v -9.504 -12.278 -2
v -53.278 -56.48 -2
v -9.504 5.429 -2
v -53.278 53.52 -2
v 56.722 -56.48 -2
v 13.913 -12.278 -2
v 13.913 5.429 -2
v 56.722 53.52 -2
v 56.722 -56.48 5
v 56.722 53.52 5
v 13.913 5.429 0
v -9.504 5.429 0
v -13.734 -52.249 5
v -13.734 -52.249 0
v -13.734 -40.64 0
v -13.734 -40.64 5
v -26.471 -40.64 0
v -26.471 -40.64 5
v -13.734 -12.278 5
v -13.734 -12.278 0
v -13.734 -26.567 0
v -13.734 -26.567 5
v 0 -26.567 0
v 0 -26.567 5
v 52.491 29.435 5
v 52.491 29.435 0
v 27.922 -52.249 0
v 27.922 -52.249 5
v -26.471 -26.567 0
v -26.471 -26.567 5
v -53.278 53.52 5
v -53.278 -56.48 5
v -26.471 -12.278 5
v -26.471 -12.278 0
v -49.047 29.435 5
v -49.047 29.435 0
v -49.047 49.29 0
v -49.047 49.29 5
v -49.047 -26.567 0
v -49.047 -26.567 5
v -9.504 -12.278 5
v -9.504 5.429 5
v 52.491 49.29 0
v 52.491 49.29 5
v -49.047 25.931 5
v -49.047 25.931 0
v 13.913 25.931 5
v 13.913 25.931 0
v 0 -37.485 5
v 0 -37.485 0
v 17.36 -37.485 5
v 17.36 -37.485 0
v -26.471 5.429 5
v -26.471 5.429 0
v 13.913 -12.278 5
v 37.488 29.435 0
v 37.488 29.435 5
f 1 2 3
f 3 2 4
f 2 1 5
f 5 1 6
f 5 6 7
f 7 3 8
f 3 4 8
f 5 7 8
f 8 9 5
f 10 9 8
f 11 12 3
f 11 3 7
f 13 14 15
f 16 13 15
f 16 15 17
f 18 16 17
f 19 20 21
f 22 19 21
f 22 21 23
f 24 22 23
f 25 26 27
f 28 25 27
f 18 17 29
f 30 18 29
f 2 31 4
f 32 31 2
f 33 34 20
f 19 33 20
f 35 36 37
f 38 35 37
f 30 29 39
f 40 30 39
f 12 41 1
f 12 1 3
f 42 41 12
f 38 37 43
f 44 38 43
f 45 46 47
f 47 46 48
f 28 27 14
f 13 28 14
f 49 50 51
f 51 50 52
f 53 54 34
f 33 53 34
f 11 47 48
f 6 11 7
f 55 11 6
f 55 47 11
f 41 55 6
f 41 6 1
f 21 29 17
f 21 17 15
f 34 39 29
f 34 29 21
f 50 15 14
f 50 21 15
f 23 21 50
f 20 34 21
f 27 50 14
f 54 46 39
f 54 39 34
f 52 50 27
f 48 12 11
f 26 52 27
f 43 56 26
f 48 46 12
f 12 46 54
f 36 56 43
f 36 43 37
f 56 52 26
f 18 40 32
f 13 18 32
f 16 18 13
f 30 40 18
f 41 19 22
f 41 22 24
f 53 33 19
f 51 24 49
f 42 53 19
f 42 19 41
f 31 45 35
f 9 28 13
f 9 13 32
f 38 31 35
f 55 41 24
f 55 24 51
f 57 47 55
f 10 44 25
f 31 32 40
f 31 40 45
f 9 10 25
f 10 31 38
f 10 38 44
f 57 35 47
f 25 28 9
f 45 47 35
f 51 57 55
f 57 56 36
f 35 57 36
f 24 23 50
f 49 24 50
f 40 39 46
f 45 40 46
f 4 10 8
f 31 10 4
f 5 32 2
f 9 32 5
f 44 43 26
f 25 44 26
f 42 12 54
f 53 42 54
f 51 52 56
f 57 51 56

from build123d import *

# Parameters (mm, degrees)
F1_DEPTH = 5
F2_DEPTH = 2


# Not quite as in the source:
# - a feature names something its author has since deleted; it is built from what else it names


with BuildPart() as f1:
    # F0 (on Top) → F1 (new body)
    with BuildSketch(Plane.XY):
        Polygon((-53.2781591106, 53.5204063327), (-53.2781591106, -56.4795936673), (-13.7344817631, -56.4795936673), (56.7218408894, -56.4795936673), (56.7218408894, 53.5204063327), align=None)
        Polygon((-49.0473898798, 29.4351325184), (-49.0473898798, 49.289637102), (52.4910716586, 49.289637102), (52.4910716586, 29.4351325184), (27.9224817305, -52.2488244365), (-13.7344817631, -52.2488244365), (-13.7344817631, -40.6398742527), (-26.4708319562, -40.6398742527), (-26.4708319562, -26.5670741801), (-49.0473898798, -26.5670741801), (-49.0473898798, 5.428542512), (-49.0473898798, 25.9305896417), (-26.4708319562, 25.9305896417), (13.9133328608, 25.9305896417), (13.9133328608, 5.428542512), (13.9133328608, -12.2777693511), (-9.5037125323, -12.2777693511), (-9.5037125323, 5.428542512), (-26.4708319562, 5.428542512), (-26.4708319562, -12.2777693511), (-13.7344817631, -12.2777693511), (-13.7344817631, -26.5670741801), (0, -26.5670741801), (0, -37.4845501322), (17.3598656954, -37.4845501322), (37.487713347, 29.4351325184), align=None, mode=Mode.SUBTRACT)
    extrude(amount=F1_DEPTH)

    # F0 (on Top) → F2 (join)
    with BuildSketch(Plane.XY):
        Polygon((-53.2781591106, 53.5204063327), (-53.2781591106, -56.4795936673), (-13.7344817631, -56.4795936673), (56.7218408894, -56.4795936673), (56.7218408894, 53.5204063327), align=None)
        Polygon((-49.0473898798, 29.4351325184), (-49.0473898798, 49.289637102), (52.4910716586, 49.289637102), (52.4910716586, 29.4351325184), (27.9224817305, -52.2488244365), (-13.7344817631, -52.2488244365), (-13.7344817631, -40.6398742527), (-26.4708319562, -40.6398742527), (-26.4708319562, -26.5670741801), (-49.0473898798, -26.5670741801), (-49.0473898798, 5.428542512), (-49.0473898798, 25.9305896417), (-26.4708319562, 25.9305896417), (13.9133328608, 25.9305896417), (13.9133328608, 5.428542512), (13.9133328608, -12.2777693511), (-9.5037125323, -12.2777693511), (-9.5037125323, 5.428542512), (-26.4708319562, 5.428542512), (-26.4708319562, -12.2777693511), (-13.7344817631, -12.2777693511), (-13.7344817631, -26.5670741801), (0, -26.5670741801), (0, -37.4845501322), (17.3598656954, -37.4845501322), (37.487713347, 29.4351325184), align=None, mode=Mode.SUBTRACT)
        Polygon((52.4910716586, 49.289637102), (-49.0473898798, 49.289637102), (-49.0473898798, 29.4351325184), (37.487713347, 29.4351325184), (17.3598656954, -37.4845501322), (0, -37.4845501322), (0, -26.5670741801), (-13.7344817631, -26.5670741801), (-13.7344817631, -12.2777693511), (-26.4708319562, -12.2777693511), (-26.4708319562, 5.428542512), (-9.5037125323, 5.428542512), (13.9133328608, 5.428542512), (13.9133328608, 25.9305896417), (-26.4708319562, 25.9305896417), (-49.0473898798, 25.9305896417), (-49.0473898798, 5.428542512), (-49.0473898798, -26.5670741801), (-26.4708319562, -26.5670741801), (-26.4708319562, -40.6398742527), (-13.7344817631, -40.6398742527), (-13.7344817631, -52.2488244365), (27.9224817305, -52.2488244365), (52.4910716586, 29.4351325184), align=None)
    extrude(amount=-F2_DEPTH)


solid = f1.part
